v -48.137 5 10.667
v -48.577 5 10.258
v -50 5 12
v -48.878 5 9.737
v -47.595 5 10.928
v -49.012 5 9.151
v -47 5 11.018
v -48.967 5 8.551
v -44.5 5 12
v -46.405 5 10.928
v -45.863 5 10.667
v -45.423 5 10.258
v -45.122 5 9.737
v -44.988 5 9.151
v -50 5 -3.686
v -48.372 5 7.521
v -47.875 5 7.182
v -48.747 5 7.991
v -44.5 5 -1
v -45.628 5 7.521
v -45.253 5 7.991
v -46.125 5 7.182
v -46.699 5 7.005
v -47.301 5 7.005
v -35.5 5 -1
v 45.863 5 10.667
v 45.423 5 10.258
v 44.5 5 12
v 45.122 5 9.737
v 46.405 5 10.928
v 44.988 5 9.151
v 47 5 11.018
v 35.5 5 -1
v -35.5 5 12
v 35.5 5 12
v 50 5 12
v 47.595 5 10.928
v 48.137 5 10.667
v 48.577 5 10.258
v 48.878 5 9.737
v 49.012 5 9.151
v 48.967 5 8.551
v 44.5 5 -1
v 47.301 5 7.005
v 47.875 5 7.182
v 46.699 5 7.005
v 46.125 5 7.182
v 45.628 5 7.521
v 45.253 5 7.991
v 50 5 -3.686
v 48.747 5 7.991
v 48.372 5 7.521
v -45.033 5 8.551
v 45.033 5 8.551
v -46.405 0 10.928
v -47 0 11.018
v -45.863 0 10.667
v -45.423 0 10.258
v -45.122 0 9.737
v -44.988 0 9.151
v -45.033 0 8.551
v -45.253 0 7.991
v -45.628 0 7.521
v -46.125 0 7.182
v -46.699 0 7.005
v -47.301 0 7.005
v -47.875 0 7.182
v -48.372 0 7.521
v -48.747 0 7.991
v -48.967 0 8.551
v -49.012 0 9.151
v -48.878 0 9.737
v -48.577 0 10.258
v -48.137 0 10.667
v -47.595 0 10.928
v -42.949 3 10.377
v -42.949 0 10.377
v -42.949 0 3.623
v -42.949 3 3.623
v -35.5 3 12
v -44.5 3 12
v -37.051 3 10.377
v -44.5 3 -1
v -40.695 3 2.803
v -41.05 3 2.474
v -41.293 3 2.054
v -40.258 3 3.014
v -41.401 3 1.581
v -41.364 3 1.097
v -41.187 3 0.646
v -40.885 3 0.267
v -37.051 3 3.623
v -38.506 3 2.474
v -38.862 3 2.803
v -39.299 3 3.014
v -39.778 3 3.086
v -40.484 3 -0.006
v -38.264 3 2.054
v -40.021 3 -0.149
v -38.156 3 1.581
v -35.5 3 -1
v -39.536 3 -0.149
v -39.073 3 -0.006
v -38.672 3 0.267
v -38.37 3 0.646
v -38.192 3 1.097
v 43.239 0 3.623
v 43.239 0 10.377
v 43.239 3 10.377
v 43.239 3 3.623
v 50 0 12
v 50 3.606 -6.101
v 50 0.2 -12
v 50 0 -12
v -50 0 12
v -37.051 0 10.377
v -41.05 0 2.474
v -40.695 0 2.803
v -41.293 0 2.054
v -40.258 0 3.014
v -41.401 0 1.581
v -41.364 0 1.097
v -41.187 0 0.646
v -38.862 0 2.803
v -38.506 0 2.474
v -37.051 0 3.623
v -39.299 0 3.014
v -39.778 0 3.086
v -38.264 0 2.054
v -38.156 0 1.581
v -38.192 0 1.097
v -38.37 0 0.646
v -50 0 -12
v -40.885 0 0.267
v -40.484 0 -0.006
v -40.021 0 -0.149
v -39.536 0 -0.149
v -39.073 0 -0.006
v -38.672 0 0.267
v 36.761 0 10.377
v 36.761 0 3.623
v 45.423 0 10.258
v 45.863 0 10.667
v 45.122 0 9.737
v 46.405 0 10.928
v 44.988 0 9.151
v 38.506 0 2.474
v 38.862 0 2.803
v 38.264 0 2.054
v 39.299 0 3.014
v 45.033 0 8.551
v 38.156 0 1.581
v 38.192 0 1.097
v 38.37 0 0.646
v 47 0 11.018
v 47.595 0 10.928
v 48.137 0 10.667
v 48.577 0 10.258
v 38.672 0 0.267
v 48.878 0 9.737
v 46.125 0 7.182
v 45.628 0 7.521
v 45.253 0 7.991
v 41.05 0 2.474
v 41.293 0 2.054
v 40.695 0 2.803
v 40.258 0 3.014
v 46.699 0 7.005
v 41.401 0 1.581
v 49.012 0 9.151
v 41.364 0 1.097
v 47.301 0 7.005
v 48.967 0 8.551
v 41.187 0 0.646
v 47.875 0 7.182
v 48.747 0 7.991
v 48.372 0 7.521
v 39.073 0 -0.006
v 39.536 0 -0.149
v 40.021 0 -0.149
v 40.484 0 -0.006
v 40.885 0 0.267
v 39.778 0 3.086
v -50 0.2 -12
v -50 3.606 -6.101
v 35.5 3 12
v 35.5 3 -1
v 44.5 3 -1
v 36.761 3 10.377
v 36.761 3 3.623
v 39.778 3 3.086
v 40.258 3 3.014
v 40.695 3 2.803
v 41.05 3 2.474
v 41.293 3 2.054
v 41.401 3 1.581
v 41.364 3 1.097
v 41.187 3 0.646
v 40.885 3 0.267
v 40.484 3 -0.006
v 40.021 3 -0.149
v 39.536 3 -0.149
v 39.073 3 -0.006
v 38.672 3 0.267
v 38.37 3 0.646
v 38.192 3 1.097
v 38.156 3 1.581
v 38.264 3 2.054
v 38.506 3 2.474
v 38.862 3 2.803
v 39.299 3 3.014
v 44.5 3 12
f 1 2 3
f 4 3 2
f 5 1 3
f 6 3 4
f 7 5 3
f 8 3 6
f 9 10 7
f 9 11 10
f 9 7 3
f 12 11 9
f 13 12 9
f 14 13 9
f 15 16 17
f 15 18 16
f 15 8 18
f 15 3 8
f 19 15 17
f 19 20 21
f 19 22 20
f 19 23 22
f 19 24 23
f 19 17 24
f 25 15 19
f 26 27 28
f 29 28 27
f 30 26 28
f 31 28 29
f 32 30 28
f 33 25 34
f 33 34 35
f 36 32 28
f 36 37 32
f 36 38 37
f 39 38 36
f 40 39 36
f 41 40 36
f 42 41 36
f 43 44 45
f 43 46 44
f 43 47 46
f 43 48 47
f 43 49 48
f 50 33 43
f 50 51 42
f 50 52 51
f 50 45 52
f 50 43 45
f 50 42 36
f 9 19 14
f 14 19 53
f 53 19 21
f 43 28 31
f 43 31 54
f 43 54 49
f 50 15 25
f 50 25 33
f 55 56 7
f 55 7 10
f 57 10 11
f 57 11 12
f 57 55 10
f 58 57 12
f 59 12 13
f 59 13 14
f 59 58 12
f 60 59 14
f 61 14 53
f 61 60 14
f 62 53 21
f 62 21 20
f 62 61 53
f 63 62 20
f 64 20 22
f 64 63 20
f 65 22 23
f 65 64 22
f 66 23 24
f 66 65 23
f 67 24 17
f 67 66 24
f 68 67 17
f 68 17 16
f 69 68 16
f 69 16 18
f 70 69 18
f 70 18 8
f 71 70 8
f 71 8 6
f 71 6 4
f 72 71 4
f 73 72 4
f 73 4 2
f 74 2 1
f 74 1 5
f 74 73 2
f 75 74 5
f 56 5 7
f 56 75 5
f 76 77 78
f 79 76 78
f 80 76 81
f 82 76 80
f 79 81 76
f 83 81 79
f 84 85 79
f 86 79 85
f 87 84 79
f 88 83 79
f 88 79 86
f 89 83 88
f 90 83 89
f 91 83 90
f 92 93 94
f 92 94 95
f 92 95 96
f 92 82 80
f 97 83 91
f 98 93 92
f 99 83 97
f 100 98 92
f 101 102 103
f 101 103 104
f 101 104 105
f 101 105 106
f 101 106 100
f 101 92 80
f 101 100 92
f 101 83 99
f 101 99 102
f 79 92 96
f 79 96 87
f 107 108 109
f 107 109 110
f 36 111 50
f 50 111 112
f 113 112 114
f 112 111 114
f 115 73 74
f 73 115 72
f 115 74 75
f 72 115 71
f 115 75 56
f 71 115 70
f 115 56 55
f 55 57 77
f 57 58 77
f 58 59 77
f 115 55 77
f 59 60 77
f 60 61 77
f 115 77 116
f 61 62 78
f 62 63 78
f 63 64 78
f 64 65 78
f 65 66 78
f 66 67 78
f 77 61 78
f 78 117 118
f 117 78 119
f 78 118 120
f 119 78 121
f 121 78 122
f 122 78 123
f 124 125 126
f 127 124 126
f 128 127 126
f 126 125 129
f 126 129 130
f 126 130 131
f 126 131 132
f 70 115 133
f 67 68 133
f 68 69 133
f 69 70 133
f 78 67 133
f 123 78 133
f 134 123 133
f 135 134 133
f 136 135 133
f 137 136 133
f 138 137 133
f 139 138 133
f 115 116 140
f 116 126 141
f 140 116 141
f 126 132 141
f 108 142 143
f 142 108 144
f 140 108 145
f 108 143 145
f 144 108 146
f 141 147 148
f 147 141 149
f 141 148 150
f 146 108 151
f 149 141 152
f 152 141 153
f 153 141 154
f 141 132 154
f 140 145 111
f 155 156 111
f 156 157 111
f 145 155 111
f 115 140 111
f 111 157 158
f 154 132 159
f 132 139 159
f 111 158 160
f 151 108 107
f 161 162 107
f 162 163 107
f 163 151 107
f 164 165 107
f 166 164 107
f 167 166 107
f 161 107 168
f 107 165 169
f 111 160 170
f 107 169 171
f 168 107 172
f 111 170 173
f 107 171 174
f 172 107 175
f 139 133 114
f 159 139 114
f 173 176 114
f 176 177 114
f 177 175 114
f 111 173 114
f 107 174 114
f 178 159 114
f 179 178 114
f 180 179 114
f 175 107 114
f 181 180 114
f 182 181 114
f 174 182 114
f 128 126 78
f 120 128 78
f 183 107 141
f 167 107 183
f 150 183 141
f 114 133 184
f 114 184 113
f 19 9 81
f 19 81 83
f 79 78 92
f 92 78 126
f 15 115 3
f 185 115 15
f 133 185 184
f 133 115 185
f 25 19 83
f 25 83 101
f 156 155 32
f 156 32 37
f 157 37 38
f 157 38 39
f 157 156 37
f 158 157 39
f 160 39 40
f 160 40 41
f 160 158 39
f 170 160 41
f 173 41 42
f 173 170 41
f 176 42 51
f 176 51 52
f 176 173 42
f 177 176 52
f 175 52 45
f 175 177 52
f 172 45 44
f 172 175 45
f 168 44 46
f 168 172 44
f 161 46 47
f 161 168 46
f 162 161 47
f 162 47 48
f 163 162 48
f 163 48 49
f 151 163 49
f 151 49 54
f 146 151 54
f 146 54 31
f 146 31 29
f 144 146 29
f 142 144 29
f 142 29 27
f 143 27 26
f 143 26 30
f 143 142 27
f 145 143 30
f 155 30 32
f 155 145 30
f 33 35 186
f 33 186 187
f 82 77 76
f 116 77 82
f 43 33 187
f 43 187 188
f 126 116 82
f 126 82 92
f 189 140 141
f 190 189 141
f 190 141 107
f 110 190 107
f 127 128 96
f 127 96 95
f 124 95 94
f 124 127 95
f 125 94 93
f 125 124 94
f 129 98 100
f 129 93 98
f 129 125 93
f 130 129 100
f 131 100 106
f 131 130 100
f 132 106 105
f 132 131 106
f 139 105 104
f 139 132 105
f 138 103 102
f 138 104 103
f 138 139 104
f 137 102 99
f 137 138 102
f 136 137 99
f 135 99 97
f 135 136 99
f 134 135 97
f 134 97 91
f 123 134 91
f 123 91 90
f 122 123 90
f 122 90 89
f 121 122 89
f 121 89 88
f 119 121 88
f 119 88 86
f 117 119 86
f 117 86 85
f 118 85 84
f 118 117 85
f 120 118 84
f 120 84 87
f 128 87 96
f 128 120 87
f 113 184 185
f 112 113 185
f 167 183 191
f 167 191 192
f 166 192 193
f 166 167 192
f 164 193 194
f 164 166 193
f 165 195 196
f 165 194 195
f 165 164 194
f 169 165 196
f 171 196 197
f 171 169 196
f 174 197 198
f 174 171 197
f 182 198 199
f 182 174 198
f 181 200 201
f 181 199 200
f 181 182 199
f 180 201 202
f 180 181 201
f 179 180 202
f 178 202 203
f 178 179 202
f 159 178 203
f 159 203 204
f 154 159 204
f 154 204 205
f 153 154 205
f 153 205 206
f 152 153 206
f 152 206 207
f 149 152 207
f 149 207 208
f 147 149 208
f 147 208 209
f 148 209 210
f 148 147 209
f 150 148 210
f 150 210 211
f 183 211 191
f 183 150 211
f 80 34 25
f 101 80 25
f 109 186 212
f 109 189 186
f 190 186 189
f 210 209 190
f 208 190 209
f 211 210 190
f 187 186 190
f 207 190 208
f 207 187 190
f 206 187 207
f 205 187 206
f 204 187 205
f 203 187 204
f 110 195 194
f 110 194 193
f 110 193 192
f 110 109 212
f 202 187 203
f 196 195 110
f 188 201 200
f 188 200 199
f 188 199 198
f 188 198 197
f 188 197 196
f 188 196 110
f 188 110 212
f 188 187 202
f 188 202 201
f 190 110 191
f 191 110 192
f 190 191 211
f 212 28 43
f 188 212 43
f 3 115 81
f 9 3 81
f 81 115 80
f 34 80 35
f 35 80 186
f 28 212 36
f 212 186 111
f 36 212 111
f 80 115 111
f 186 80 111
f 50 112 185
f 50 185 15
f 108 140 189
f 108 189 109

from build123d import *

# Parameters (mm, degrees)
CROQUIS1_W                 = 100
CROQUIS1_H                 = 24
CROQUIS1_R                 = 2.017504942
CROQUIS1_W_2               = 5.897168216
CROQUIS1_H_2               = 6.754663932
CROQUIS1_W_3               = 6.477766384
SALIENTE_EXTRUIR1_DEPTH    = 5
CROQUIS2_W                 = 9
CROQUIS2_H                 = 13
CROQUIS2_R                 = 2.5
CORTAR_EXTRUIR1_DEPTH      = 2
CORTAR_EXTRUIR5_DEPTH      = 141
CORTAR_EXTRUIR6_DEPTH      = 21
CORTAR_EXTRUIR6_DEPTH_BACK = 26
CROQUIS5_R                 = 1.626798587


with BuildPart() as part:
    # Croquis1 → Saliente-Extruir1 (new body)
    with BuildSketch(Plane(origin=(0, 0, 0), x_dir=(1, 0, 0), z_dir=(0, 1, 0))):
        Rectangle(CROQUIS1_W, CROQUIS1_H)
        with Locations(Location((-47, -9, 0), (0, 0, 270))):
            Circle(CROQUIS1_R, mode=Mode.SUBTRACT)
        with Locations(Location((47, -9, 0), (0, 0, 270))):
            Circle(CROQUIS1_R, mode=Mode.SUBTRACT)
        with Locations((-40, -7)):
            Rectangle(CROQUIS1_W_2, CROQUIS1_H_2, mode=Mode.SUBTRACT)
        with Locations((40, -7)):
            Rectangle(CROQUIS1_W_3, CROQUIS1_H_2, mode=Mode.SUBTRACT)
    extrude(amount=SALIENTE_EXTRUIR1_DEPTH)

    # Croquis2 → Cortar-Extruir1 (cut)
    # profile 1 of 2: a face of its own
    with BuildSketch(Plane(origin=(0, 5, 0), x_dir=(1, 0, 0), z_dir=(0, 1, 0))):
        with Locations((-40, -5.5)):
            Rectangle(CROQUIS2_W, CROQUIS2_H)
        with Locations((-40, -7)):
            Circle(CROQUIS2_R, mode=Mode.SUBTRACT)
    # profile 2 of 2: a face of its own
    with BuildSketch(Plane(origin=(0, 5, 0), x_dir=(1, 0, 0), z_dir=(0, 1, 0))):
        with Locations((40, -5.5)):
            Rectangle(CROQUIS2_W, CROQUIS2_H)
        with Locations((40, -7)):
            Circle(CROQUIS2_R, mode=Mode.SUBTRACT)
    extrude(amount=-CORTAR_EXTRUIR1_DEPTH, mode=Mode.SUBTRACT)

    # Croquis3 → Cortar-Extruir5 (cut)
    with BuildSketch(Plane.ZY.offset(50)):
        Polygon((-12, 5), (-12, 0.2), (-6.100895765, 3.605849418), (-3.686156124, 5), align=None)
        Polygon((-12.757171087, 0.2), (-12, 0.2), (-12, 5), (-3.686156124, 5), (-3.039853353, 5.373143079), (-12.757171087, 5.373143079), align=None)
    extrude(amount=-CORTAR_EXTRUIR5_DEPTH, mode=Mode.SUBTRACT)

    # Croquis5 → Cortar-Extruir6 (cut, two sides: drawn at the far end of the back side and taken through both)
    with BuildSketch(Plane(origin=(0, 3, 0), x_dir=(1, 0, 0), z_dir=(0, 1, 0)).offset(-CORTAR_EXTRUIR6_DEPTH_BACK)):
        with Locations(Location((39.778371373, -1.459300721, 0), (0, 0, 270))):
            Circle(CROQUIS5_R)
        with Locations(Location((-39.778371373, -1.459300721, 0), (0, 0, 270))):
            Circle(CROQUIS5_R)
    extrude(amount=CORTAR_EXTRUIR6_DEPTH + CORTAR_EXTRUIR6_DEPTH_BACK, mode=Mode.SUBTRACT)


solid = part.part
